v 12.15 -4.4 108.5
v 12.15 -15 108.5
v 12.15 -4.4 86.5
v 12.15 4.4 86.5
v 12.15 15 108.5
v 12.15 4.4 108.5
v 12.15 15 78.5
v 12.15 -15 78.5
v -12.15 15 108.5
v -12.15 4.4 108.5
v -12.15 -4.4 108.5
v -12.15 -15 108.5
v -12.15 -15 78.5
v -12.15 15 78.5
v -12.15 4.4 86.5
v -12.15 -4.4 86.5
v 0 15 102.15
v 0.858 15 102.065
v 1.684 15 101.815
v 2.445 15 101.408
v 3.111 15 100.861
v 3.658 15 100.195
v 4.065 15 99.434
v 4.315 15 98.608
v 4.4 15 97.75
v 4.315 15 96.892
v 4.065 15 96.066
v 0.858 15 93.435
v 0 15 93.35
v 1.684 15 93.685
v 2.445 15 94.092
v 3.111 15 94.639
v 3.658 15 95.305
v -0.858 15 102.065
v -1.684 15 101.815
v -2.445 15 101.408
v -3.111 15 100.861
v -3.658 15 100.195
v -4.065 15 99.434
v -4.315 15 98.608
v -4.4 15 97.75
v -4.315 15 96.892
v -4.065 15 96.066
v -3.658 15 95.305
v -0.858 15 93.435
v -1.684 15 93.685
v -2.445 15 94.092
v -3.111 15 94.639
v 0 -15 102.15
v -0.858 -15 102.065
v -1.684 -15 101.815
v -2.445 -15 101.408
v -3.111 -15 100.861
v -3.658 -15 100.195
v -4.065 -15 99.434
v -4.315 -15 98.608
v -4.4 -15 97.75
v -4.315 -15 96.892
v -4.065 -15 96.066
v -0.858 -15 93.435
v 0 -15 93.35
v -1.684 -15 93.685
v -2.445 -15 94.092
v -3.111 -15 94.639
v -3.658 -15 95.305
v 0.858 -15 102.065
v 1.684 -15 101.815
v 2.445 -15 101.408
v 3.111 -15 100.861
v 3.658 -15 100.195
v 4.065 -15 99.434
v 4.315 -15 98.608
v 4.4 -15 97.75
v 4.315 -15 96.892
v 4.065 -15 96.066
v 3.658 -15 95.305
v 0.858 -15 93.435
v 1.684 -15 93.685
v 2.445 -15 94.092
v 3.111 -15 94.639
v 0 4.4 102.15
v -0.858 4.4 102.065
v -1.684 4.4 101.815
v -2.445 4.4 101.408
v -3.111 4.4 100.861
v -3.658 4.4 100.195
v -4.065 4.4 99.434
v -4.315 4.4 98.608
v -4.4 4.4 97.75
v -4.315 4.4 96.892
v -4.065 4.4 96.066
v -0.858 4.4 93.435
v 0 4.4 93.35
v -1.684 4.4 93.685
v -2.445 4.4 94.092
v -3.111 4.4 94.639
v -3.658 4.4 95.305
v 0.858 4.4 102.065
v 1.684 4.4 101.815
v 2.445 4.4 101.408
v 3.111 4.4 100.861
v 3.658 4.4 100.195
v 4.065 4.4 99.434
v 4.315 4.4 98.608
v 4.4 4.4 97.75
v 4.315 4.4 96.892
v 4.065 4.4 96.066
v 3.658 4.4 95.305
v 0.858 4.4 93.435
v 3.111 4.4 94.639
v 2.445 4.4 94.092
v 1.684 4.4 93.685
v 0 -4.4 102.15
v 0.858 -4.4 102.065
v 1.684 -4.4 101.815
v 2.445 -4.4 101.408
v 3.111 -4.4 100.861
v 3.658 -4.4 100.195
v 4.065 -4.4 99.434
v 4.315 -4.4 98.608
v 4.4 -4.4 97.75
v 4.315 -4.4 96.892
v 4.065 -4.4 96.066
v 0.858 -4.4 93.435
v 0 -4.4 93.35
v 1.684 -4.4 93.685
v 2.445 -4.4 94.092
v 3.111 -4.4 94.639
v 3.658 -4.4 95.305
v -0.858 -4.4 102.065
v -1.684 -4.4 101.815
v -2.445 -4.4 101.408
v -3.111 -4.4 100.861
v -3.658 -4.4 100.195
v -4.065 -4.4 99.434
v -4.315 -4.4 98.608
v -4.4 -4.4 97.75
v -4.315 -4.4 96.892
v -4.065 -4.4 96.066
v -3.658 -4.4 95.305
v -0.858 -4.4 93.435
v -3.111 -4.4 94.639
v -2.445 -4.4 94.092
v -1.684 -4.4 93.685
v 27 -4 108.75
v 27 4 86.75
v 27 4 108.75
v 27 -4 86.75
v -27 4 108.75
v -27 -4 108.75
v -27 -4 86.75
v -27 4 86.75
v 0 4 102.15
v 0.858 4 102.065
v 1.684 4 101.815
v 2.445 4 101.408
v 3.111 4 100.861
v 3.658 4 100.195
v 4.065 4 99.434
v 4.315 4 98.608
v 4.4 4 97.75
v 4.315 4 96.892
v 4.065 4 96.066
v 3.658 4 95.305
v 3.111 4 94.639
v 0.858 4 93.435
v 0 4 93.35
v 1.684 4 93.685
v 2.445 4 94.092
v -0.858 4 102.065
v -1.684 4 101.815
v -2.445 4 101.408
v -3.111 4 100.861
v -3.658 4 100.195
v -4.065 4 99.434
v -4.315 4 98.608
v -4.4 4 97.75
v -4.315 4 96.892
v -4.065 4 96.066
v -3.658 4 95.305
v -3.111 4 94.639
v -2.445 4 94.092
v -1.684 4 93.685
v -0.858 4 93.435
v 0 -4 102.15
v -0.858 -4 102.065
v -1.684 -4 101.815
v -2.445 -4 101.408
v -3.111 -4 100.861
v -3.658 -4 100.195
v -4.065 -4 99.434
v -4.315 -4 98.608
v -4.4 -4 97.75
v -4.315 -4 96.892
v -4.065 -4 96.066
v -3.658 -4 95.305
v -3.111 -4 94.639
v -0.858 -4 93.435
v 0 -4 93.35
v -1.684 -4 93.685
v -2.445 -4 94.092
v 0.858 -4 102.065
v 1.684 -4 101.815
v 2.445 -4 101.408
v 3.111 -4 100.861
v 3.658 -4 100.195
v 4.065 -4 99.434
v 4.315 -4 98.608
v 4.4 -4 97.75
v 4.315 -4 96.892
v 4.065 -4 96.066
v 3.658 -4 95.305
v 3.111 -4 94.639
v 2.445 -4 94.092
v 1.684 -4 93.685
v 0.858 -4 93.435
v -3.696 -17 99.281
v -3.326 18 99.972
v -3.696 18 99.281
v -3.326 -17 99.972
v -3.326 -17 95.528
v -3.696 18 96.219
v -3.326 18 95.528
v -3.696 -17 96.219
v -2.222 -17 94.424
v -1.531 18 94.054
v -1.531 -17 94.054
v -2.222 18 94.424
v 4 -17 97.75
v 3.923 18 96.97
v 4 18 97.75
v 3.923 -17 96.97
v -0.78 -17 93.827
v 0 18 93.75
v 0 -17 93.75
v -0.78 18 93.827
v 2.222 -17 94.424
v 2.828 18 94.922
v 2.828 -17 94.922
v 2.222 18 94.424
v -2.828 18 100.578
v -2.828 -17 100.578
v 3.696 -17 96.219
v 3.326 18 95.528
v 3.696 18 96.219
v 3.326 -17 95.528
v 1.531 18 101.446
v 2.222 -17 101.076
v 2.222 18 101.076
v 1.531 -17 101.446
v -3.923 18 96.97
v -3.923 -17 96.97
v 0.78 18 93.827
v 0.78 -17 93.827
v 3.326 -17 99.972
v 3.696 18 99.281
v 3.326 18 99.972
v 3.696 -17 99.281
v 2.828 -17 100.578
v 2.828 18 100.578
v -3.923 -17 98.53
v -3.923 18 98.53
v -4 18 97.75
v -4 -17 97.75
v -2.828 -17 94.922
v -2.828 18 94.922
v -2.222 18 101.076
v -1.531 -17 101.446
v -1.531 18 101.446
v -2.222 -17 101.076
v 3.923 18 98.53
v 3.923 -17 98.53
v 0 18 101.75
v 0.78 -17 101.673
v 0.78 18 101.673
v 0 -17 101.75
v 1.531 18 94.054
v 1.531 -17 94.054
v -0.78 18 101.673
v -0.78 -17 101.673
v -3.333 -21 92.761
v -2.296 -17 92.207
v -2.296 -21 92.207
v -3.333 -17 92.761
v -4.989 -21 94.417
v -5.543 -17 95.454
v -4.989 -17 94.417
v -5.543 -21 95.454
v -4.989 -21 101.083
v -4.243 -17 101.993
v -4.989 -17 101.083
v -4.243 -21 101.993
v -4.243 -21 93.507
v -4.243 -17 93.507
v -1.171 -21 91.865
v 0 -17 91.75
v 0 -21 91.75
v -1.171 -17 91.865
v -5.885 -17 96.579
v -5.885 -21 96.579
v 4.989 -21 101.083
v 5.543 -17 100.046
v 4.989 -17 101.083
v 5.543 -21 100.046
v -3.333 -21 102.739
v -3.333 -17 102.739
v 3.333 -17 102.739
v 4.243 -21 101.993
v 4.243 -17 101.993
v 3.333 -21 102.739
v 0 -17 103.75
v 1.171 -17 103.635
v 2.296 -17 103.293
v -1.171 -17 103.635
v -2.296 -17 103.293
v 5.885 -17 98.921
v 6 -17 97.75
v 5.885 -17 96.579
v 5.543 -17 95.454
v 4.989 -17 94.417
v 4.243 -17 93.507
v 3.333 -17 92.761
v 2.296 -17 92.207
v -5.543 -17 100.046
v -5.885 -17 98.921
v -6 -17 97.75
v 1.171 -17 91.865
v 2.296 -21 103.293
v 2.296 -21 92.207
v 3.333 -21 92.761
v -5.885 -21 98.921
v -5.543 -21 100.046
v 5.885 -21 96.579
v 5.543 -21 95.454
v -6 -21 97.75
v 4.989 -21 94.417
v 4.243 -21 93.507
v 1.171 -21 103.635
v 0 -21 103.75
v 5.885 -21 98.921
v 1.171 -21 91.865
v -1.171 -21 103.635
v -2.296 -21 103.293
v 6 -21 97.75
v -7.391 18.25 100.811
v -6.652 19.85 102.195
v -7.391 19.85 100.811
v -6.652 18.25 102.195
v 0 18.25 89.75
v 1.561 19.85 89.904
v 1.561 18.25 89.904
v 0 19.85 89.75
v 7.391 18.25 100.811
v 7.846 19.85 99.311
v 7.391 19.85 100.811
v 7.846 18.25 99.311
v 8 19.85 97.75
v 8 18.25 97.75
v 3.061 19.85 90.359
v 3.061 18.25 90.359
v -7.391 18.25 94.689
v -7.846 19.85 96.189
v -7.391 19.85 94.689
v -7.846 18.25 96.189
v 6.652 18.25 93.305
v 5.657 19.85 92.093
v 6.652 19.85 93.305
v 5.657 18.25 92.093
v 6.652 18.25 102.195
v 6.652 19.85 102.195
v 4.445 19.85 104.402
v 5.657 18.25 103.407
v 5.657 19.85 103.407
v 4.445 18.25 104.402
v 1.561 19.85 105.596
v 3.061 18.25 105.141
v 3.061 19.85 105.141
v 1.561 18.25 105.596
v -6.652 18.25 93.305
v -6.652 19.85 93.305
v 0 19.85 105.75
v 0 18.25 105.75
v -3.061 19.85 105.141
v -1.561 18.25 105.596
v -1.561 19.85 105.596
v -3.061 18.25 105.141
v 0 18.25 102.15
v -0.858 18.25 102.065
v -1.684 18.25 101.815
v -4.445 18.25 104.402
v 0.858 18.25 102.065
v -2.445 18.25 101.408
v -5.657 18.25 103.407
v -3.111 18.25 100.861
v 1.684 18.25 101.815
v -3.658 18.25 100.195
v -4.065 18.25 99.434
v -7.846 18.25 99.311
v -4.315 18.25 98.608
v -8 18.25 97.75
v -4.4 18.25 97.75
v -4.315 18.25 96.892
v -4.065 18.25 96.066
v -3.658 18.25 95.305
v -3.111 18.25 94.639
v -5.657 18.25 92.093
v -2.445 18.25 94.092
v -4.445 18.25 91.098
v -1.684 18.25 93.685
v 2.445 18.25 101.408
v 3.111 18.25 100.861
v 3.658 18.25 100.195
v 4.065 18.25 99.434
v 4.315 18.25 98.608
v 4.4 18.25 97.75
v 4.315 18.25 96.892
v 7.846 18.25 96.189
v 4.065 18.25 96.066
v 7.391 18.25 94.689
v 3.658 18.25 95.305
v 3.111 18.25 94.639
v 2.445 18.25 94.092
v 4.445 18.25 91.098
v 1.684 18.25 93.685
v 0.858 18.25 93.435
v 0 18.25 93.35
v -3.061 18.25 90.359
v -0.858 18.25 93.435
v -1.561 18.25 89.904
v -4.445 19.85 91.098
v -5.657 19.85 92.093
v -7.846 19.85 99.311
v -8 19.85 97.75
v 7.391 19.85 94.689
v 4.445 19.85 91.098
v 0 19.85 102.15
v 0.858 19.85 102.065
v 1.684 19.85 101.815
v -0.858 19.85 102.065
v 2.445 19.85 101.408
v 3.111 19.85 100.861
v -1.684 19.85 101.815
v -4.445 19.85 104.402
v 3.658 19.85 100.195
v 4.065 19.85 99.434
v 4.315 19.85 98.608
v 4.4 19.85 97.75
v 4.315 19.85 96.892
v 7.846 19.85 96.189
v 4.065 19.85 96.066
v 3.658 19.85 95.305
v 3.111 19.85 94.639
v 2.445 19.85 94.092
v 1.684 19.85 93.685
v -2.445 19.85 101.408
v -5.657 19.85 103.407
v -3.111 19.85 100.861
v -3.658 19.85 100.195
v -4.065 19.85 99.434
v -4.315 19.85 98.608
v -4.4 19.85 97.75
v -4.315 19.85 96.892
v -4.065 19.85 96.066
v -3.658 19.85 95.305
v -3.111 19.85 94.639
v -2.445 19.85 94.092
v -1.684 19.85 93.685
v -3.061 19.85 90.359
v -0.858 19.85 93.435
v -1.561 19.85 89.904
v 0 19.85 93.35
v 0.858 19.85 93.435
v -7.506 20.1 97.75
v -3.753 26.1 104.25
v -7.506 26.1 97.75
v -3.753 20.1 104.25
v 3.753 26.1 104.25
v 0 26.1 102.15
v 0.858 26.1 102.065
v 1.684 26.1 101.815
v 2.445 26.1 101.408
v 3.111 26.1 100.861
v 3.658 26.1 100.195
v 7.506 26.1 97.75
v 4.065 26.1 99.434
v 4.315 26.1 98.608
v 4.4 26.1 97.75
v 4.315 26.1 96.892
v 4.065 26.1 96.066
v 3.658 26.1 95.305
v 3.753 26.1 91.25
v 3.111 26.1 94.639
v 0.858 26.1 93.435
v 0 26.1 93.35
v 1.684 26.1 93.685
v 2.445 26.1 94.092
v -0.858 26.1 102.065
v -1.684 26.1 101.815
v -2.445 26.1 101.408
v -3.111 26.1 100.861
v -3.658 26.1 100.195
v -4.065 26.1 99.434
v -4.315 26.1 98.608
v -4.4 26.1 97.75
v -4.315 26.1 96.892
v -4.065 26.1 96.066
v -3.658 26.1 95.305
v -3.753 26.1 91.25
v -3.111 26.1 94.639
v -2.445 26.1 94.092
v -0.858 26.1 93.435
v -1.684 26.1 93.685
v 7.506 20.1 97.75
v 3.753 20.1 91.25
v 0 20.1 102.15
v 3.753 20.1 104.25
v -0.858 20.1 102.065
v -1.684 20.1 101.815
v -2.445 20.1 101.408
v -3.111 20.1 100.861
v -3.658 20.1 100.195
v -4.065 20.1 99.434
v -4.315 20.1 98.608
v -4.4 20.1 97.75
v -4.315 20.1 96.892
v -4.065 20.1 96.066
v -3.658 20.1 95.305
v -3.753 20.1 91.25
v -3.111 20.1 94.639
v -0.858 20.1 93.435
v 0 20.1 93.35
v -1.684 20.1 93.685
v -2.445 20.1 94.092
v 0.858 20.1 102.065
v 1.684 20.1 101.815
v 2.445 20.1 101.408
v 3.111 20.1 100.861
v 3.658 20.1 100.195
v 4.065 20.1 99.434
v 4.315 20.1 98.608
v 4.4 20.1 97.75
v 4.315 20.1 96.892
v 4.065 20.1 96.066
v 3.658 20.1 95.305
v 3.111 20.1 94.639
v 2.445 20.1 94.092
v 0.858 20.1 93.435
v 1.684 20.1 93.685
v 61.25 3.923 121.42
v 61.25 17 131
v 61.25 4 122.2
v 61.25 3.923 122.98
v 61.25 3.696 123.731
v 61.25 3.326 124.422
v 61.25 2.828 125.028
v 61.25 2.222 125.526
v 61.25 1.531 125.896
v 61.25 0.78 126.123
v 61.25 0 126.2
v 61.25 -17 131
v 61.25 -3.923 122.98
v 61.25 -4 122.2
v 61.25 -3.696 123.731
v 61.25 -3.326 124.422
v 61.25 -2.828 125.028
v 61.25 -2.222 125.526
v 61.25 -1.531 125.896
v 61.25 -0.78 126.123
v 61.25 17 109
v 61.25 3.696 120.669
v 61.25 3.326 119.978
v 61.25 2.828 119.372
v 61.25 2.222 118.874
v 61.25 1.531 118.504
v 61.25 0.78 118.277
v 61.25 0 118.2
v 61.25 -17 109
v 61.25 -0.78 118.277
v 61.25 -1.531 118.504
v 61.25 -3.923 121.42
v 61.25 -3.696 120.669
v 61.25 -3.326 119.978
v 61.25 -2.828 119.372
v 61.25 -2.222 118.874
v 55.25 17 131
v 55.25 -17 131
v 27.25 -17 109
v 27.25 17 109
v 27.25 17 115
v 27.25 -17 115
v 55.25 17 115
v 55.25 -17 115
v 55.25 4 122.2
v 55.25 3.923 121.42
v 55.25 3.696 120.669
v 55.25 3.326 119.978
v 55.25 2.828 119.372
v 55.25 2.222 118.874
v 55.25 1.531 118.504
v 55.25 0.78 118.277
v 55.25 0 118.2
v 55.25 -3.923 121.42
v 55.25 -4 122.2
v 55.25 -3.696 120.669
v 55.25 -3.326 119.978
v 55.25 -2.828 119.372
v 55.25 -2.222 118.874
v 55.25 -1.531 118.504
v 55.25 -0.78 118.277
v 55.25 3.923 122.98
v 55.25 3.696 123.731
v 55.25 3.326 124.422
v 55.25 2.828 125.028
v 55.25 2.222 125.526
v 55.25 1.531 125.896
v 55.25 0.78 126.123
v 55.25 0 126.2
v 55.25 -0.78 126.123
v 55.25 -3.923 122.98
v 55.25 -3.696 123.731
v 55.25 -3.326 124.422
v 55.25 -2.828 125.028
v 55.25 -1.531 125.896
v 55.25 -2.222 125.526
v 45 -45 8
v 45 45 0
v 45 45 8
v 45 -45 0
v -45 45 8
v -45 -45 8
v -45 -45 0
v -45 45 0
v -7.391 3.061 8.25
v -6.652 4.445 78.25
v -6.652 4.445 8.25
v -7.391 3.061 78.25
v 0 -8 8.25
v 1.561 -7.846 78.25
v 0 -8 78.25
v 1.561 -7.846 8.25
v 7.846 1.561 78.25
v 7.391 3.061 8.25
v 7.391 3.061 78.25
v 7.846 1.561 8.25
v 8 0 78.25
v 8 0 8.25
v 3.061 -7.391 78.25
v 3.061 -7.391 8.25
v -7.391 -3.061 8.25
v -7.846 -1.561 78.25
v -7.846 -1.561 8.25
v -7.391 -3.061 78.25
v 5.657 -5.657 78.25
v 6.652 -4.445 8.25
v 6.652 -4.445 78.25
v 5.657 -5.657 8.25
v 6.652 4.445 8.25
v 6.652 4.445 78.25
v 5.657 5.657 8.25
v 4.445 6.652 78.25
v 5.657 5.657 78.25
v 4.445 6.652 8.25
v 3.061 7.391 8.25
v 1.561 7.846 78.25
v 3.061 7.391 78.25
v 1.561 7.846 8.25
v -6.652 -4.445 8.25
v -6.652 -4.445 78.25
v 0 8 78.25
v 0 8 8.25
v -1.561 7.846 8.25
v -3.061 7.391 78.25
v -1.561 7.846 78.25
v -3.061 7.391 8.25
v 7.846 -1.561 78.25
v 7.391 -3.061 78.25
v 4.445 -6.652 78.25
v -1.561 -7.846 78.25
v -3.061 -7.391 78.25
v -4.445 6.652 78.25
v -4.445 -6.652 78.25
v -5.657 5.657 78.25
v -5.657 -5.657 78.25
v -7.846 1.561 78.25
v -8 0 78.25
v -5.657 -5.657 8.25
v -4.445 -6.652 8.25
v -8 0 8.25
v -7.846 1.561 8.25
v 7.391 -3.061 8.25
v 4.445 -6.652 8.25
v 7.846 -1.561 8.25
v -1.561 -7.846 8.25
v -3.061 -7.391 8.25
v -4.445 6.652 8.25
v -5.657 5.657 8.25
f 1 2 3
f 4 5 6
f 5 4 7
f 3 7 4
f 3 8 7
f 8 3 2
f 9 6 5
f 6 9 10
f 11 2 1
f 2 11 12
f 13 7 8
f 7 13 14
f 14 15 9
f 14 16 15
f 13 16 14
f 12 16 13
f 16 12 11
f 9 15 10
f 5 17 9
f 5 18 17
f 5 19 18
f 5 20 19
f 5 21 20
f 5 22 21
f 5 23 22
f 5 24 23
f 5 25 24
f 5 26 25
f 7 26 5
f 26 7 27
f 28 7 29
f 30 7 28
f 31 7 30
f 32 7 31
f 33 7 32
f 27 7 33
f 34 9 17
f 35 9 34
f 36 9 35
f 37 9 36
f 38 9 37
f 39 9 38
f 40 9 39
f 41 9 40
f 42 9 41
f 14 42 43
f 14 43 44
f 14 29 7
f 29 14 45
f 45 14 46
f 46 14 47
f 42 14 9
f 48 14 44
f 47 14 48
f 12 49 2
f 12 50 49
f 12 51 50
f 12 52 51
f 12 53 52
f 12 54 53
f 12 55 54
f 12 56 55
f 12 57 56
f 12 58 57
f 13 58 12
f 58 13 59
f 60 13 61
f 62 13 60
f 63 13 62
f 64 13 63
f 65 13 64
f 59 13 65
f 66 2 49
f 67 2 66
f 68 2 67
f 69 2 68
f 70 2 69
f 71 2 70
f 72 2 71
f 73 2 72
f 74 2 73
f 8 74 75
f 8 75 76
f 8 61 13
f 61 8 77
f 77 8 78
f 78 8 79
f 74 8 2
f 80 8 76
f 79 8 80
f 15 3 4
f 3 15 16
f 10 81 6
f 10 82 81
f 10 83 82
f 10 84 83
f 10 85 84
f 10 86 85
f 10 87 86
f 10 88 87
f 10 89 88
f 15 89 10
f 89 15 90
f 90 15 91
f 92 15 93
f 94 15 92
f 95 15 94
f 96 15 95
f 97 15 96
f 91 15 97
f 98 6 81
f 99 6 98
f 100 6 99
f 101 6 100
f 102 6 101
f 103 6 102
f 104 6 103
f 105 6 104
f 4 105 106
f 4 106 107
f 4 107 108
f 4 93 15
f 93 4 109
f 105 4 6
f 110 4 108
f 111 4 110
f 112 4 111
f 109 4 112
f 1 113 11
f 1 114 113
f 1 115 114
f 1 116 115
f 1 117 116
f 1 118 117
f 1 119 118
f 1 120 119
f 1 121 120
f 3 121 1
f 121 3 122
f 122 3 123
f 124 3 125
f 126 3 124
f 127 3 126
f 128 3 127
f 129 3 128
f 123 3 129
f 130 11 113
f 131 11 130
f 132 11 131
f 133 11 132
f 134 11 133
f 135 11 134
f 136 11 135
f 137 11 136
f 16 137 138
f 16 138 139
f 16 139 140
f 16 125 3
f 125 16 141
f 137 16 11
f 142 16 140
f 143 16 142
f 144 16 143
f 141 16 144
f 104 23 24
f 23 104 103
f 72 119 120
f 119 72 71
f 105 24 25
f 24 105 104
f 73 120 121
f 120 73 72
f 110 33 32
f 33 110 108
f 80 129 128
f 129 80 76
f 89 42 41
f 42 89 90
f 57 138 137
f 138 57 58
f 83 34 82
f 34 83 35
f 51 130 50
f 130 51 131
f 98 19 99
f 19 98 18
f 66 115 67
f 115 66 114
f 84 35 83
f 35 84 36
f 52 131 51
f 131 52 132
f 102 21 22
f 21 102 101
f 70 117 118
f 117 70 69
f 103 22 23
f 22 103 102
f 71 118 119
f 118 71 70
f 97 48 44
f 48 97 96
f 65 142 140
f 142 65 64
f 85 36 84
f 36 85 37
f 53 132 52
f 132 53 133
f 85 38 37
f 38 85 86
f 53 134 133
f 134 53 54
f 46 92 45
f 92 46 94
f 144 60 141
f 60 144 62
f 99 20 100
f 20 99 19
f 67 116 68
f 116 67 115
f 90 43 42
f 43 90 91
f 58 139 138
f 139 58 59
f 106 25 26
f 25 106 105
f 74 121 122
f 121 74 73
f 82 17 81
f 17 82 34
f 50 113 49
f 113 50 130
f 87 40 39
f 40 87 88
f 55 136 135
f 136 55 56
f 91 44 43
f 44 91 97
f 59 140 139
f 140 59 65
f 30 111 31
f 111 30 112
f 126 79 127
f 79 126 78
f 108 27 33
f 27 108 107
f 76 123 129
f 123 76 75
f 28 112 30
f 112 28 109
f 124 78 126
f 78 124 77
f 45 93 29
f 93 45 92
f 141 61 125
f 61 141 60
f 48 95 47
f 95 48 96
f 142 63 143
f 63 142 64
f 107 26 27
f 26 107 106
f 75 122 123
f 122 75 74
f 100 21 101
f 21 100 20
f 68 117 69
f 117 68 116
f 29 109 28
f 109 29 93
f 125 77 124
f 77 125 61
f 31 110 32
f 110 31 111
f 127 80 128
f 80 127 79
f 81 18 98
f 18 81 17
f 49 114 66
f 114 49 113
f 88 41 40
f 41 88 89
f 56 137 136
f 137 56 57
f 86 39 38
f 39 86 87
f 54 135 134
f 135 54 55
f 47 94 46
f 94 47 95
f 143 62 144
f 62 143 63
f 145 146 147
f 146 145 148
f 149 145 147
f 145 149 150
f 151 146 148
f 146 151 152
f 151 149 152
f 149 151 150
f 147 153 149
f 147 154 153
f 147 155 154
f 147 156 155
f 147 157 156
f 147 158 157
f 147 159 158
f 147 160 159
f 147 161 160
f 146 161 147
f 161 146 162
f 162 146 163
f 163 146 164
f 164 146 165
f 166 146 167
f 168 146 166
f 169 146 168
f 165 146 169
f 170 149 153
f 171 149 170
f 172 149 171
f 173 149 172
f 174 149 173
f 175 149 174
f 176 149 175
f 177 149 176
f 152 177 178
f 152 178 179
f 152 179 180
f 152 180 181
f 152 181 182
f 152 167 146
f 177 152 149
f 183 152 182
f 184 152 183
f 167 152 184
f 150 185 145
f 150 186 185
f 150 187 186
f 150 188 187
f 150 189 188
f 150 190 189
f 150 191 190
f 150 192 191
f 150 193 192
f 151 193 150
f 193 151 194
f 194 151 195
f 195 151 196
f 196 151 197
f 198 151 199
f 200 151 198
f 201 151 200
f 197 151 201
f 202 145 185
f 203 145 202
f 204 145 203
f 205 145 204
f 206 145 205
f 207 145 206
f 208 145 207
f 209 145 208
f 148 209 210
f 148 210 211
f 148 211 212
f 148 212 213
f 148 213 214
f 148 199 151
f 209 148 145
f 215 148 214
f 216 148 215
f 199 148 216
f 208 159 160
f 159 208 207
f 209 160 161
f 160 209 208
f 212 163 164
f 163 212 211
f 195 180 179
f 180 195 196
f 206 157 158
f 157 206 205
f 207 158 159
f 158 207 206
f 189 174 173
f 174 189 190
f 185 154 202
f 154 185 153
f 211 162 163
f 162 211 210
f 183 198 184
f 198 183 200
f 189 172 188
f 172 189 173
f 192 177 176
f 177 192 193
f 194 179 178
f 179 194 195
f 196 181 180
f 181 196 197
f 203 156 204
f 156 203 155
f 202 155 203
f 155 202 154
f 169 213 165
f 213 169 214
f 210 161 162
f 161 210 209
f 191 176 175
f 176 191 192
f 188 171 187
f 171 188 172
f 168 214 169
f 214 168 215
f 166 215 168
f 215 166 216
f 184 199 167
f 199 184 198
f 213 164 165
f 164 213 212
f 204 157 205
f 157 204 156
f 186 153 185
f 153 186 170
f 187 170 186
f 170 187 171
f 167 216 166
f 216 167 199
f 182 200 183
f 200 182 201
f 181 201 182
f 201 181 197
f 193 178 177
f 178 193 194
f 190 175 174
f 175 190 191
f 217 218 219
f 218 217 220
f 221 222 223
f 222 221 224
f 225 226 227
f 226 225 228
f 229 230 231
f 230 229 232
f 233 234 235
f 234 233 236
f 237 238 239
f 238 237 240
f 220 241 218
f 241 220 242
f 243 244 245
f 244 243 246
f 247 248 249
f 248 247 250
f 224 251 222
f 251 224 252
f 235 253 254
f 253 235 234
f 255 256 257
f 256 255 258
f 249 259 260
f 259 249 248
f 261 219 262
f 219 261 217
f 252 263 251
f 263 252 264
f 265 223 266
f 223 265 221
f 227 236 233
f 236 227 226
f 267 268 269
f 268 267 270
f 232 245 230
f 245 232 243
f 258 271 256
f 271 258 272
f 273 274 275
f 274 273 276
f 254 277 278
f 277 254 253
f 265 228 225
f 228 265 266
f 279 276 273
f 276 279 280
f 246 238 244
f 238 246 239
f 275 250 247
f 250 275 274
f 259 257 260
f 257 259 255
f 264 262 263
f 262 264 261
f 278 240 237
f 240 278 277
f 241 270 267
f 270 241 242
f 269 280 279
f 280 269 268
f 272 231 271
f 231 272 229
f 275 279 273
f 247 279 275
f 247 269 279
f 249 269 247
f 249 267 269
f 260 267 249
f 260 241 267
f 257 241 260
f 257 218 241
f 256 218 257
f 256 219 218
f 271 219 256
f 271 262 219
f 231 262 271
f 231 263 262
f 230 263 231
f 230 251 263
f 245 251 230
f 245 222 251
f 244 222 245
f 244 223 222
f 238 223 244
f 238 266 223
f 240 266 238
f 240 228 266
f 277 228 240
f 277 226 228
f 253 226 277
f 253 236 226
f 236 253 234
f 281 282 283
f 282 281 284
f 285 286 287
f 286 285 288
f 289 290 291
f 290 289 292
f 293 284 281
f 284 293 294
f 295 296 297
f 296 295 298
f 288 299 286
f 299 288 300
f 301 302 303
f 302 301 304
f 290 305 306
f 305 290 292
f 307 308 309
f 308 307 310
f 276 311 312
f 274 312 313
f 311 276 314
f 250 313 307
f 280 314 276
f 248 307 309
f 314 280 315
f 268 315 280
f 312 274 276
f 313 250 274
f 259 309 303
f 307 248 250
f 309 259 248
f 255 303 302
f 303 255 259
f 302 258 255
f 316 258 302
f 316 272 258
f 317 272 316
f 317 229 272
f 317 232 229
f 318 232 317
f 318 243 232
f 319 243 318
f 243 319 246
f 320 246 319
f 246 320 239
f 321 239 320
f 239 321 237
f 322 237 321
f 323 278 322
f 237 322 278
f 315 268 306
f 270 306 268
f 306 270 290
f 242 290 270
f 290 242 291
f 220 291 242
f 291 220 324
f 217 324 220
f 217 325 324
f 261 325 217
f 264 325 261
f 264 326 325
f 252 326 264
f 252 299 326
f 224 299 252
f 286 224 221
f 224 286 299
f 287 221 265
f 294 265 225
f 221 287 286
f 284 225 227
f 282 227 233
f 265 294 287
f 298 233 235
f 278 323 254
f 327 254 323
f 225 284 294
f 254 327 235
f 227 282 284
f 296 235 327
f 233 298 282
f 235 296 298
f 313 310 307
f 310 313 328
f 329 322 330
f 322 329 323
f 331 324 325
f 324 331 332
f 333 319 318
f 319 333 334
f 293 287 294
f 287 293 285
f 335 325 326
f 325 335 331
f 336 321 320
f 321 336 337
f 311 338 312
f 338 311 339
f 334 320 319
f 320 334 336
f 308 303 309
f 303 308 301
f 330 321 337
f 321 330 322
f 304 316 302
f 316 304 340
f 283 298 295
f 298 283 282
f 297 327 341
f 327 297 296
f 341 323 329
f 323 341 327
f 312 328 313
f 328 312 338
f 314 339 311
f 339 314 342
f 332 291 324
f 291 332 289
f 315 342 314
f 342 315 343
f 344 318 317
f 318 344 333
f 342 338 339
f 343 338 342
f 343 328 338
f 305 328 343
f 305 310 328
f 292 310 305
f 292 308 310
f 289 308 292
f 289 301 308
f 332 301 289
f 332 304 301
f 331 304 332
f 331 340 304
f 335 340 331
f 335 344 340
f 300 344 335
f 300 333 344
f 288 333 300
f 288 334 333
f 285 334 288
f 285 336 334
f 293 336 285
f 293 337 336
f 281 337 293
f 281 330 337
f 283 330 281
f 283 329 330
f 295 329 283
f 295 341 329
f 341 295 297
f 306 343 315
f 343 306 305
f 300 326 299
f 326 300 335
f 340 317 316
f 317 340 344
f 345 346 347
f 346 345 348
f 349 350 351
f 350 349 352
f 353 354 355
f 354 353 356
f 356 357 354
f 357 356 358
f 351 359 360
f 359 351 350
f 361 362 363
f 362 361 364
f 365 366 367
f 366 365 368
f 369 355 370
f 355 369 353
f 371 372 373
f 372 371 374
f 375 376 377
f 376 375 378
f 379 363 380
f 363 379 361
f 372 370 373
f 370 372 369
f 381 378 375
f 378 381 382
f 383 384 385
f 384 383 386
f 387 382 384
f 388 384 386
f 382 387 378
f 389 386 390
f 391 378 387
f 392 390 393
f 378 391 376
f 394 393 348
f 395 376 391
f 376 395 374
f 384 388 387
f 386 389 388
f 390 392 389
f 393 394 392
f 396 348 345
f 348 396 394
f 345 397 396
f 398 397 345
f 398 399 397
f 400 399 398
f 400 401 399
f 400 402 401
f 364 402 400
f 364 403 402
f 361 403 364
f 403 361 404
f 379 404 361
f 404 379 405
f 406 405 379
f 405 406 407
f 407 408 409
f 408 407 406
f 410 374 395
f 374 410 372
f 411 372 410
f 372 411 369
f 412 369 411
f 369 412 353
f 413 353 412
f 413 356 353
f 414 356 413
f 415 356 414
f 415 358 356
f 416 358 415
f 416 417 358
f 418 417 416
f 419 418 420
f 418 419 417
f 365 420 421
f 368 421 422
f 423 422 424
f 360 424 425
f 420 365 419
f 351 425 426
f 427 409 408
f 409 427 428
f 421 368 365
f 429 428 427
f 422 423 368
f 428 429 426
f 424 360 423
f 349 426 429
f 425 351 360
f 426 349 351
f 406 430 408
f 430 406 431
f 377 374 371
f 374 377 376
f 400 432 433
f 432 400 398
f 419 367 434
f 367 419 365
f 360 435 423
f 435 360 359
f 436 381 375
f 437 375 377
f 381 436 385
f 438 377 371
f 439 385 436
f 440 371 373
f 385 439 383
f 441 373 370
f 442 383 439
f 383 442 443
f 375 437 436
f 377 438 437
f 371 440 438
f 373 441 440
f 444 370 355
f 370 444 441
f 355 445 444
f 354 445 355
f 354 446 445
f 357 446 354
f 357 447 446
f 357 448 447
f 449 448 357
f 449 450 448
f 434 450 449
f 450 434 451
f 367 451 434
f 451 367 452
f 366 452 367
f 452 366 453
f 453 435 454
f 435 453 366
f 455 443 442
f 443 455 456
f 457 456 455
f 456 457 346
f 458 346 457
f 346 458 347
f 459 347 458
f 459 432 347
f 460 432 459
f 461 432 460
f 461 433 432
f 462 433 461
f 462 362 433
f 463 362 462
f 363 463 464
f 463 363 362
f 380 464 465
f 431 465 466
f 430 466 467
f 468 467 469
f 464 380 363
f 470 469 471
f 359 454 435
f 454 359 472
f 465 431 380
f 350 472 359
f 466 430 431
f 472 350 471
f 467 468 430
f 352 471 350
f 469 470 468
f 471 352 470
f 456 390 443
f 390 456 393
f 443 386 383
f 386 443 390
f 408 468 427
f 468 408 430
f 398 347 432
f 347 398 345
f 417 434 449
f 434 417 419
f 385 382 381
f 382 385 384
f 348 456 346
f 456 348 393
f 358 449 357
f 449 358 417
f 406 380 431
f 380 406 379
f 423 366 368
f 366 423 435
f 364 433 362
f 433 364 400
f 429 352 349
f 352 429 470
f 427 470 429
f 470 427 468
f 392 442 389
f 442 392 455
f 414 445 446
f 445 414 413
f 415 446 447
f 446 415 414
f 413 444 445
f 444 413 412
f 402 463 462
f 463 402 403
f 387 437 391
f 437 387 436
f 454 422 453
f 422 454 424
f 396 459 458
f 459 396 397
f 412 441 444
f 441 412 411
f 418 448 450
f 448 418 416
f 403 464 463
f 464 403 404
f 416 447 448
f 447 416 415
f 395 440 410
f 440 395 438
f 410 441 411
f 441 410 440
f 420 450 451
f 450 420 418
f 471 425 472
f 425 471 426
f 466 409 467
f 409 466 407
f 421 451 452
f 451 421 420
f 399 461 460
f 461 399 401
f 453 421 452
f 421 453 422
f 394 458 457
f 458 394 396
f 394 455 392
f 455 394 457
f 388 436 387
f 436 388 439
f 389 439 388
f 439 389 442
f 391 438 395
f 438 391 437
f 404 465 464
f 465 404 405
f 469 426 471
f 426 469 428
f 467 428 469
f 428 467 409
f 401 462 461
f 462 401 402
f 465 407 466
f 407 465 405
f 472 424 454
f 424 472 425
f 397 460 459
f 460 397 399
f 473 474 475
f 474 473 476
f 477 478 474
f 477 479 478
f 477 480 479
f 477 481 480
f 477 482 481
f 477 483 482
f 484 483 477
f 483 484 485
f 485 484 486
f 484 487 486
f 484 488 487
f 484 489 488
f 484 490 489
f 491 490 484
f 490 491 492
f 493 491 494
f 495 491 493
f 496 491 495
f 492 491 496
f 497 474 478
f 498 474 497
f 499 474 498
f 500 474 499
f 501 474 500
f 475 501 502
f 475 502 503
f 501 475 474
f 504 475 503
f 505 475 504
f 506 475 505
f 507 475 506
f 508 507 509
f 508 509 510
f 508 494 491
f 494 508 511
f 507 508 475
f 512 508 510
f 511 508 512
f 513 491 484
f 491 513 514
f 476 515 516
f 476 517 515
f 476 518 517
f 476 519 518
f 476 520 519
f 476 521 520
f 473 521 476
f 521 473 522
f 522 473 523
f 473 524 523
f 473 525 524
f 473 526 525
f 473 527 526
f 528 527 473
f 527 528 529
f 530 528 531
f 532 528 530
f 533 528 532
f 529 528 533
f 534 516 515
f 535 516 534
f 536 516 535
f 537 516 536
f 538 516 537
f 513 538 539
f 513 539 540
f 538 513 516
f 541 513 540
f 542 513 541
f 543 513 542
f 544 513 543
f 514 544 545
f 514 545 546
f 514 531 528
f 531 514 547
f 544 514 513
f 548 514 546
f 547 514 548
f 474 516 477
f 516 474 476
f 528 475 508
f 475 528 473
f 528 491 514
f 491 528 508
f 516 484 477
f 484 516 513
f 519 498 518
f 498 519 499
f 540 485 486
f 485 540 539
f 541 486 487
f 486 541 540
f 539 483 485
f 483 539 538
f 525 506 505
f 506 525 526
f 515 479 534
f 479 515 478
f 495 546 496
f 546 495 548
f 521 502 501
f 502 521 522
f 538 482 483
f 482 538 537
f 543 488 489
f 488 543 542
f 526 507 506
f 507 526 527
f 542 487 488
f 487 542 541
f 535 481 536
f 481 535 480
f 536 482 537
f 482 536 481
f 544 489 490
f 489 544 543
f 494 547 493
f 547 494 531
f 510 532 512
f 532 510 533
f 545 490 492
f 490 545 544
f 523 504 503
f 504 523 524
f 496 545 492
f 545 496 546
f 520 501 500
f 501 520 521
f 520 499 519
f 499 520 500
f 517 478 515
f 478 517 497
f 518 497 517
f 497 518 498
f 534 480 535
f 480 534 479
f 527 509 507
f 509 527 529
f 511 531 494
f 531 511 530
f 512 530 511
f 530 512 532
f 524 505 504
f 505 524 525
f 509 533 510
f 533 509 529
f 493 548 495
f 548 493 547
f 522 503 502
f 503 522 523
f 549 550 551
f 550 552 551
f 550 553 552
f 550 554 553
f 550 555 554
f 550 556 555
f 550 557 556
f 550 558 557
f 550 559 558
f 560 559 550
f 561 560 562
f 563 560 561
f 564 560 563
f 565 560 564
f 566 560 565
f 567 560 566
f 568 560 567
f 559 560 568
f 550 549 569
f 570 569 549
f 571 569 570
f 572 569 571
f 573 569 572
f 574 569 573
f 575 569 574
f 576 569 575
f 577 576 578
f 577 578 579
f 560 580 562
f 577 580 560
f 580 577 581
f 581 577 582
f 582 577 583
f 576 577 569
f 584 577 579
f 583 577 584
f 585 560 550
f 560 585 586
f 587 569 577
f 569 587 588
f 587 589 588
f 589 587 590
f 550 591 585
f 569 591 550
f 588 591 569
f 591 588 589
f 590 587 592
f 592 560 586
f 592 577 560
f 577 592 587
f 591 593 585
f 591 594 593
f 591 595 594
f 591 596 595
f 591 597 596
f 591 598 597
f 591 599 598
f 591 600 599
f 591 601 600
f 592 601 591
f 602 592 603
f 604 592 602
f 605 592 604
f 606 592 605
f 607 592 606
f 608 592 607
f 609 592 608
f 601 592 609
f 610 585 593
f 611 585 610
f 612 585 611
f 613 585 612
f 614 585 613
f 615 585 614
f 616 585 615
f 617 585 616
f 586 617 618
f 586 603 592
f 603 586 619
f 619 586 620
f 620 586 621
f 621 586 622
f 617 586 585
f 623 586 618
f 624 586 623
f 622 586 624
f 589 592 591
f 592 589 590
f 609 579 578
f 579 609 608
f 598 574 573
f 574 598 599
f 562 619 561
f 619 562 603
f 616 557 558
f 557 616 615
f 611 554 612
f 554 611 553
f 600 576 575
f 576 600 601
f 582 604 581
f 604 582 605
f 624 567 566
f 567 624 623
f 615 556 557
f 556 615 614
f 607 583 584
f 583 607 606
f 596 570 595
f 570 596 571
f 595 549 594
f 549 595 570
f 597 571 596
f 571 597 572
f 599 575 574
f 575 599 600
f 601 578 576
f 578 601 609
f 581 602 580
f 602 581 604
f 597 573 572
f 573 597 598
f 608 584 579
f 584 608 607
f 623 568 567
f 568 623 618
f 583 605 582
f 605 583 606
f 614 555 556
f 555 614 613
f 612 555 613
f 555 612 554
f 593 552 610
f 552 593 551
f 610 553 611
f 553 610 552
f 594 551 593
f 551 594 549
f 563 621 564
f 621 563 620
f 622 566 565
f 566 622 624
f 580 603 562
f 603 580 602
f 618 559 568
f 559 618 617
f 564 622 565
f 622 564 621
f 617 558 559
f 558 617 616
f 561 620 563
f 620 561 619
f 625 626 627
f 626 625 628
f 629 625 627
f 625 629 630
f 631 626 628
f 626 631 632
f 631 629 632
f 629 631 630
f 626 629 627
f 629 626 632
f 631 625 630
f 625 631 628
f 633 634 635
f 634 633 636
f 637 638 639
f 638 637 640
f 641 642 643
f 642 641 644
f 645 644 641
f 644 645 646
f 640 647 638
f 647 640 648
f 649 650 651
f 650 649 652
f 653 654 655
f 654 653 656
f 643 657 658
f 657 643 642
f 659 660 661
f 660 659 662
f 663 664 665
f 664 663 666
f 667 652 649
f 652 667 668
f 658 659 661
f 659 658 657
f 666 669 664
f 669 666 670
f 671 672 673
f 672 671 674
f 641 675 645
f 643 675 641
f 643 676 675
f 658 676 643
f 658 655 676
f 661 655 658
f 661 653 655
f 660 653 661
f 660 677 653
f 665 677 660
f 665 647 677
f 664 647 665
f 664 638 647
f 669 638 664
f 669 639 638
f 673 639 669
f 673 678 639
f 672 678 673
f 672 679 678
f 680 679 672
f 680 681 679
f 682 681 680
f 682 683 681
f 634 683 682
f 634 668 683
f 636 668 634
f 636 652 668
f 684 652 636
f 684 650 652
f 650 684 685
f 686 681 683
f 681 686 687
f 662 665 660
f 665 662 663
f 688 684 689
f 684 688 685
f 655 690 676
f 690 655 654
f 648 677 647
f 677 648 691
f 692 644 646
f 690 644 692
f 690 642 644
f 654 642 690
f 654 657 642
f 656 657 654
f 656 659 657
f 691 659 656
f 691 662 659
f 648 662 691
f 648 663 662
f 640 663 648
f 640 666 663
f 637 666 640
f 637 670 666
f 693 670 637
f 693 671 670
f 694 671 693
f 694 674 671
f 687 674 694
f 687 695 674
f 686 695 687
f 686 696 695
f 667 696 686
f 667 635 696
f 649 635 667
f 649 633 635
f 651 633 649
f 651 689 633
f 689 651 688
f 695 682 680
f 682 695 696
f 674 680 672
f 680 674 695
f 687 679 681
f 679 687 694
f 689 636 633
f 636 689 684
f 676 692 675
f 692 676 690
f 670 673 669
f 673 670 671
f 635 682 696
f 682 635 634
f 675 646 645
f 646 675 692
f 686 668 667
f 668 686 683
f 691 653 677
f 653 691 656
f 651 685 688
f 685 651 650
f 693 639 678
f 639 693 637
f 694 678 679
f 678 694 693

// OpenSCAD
$fn = 32;

// ------------------------------------------------------------------------
// Lamp arm: column d16 x 70 mm, arm 54 mm
// Every part is its own module, assembly() places every instance.
// ------------------------------------------------------------------------

// --- part 1 ---
module lamp_base() {
  difference() {
    translate([-45, -45, 0]) cube([90, 90, 8]);
  }
}

// --- part 2 ---
module lamp_column() {
  cylinder(h = 70, d = 16);
}

// --- part 3 ---
module head_fork() {
  difference() {
    translate([-12.15, -15, 0]) cube([24.3, 30, 30]);
    translate([-13.15, -4.4, 8]) cube([26.3, 8.8, 23]);
    translate([0, 0, 19.25]) rotate([90, 0, 0]) cylinder(h = 32, d = 8.8, center = true);
  }
}

// --- part 4 ---
module lamp_arm() {
  difference() {
    translate([-27, -4, 0]) cube([54, 8, 22]);
    translate([0, 0, 11]) rotate([90, 0, 0]) cylinder(h = 10, d = 8.8, center = true);
  }
}

// --- part 5 ---
module arm_pin() {
  rotate([0, 90, 0]) cylinder(h = 36, d = 8, center = true);
  translate([-21, 0, 0]) rotate([0, 90, 0]) cylinder(h = 4, d = 12);
}

// --- part 6 ---
module arm_washer() {
  difference() {
      translate([0, 0, 0]) cylinder(h = 1.6, d = 16);
      translate([0, 0, -1]) cylinder(h = 3.6, d = 8.8);
    }
}

// --- part 7 ---
module arm_nut() {
  difference() {
    linear_extrude(height = 6) polygon(points = [[7.506, 0], [3.753, 6.5], [-3.753, 6.5], [-7.506, 0], [-3.753, -6.5], [3.753, -6.5]]);
    translate([0, 0, -1]) cylinder(h = 8, d = 8.8);
  }
}

// --- part 8 ---
module shade_bracket() {
  difference() {
    translate([-17, -17, 0]) cube([34, 34, 22]);
    translate([-18, -18, 6]) cube([29, 36, 17]);
    translate([14, 0, 13.2]) rotate([0, 90, 0]) cylinder(h = 8, d = 8, center = true);
  }
}

// --- assembly ---
module assembly() {
  color([0.80, 0.24, 0.20]) translate([0, 0, 0]) rotate([0, 0, 0]) lamp_base();
  color([0.20, 0.45, 0.75]) translate([0, 0, 8.25]) rotate([0, 0, 0]) lamp_column();
  color([0.25, 0.62, 0.32]) translate([0, 0, 78.5]) rotate([0, 0, 0]) head_fork();
  color([0.92, 0.70, 0.18]) translate([0, 0, 86.75]) rotate([0, 0, 0]) lamp_arm();
  color([0.58, 0.35, 0.70]) translate([0, 0, 97.75]) rotate([0, 0, 90]) arm_pin();
  color([0.16, 0.66, 0.66]) translate([0, 19.85, 97.75]) rotate([90, 0, 0]) arm_washer();
  color([0.85, 0.48, 0.18]) translate([0, 26.1, 97.75]) rotate([90, 0, 0]) arm_nut();
  color([0.55, 0.60, 0.65]) translate([44.25, 0, 109]) rotate([0, 0, 0]) shade_bracket();
}

assembly();
